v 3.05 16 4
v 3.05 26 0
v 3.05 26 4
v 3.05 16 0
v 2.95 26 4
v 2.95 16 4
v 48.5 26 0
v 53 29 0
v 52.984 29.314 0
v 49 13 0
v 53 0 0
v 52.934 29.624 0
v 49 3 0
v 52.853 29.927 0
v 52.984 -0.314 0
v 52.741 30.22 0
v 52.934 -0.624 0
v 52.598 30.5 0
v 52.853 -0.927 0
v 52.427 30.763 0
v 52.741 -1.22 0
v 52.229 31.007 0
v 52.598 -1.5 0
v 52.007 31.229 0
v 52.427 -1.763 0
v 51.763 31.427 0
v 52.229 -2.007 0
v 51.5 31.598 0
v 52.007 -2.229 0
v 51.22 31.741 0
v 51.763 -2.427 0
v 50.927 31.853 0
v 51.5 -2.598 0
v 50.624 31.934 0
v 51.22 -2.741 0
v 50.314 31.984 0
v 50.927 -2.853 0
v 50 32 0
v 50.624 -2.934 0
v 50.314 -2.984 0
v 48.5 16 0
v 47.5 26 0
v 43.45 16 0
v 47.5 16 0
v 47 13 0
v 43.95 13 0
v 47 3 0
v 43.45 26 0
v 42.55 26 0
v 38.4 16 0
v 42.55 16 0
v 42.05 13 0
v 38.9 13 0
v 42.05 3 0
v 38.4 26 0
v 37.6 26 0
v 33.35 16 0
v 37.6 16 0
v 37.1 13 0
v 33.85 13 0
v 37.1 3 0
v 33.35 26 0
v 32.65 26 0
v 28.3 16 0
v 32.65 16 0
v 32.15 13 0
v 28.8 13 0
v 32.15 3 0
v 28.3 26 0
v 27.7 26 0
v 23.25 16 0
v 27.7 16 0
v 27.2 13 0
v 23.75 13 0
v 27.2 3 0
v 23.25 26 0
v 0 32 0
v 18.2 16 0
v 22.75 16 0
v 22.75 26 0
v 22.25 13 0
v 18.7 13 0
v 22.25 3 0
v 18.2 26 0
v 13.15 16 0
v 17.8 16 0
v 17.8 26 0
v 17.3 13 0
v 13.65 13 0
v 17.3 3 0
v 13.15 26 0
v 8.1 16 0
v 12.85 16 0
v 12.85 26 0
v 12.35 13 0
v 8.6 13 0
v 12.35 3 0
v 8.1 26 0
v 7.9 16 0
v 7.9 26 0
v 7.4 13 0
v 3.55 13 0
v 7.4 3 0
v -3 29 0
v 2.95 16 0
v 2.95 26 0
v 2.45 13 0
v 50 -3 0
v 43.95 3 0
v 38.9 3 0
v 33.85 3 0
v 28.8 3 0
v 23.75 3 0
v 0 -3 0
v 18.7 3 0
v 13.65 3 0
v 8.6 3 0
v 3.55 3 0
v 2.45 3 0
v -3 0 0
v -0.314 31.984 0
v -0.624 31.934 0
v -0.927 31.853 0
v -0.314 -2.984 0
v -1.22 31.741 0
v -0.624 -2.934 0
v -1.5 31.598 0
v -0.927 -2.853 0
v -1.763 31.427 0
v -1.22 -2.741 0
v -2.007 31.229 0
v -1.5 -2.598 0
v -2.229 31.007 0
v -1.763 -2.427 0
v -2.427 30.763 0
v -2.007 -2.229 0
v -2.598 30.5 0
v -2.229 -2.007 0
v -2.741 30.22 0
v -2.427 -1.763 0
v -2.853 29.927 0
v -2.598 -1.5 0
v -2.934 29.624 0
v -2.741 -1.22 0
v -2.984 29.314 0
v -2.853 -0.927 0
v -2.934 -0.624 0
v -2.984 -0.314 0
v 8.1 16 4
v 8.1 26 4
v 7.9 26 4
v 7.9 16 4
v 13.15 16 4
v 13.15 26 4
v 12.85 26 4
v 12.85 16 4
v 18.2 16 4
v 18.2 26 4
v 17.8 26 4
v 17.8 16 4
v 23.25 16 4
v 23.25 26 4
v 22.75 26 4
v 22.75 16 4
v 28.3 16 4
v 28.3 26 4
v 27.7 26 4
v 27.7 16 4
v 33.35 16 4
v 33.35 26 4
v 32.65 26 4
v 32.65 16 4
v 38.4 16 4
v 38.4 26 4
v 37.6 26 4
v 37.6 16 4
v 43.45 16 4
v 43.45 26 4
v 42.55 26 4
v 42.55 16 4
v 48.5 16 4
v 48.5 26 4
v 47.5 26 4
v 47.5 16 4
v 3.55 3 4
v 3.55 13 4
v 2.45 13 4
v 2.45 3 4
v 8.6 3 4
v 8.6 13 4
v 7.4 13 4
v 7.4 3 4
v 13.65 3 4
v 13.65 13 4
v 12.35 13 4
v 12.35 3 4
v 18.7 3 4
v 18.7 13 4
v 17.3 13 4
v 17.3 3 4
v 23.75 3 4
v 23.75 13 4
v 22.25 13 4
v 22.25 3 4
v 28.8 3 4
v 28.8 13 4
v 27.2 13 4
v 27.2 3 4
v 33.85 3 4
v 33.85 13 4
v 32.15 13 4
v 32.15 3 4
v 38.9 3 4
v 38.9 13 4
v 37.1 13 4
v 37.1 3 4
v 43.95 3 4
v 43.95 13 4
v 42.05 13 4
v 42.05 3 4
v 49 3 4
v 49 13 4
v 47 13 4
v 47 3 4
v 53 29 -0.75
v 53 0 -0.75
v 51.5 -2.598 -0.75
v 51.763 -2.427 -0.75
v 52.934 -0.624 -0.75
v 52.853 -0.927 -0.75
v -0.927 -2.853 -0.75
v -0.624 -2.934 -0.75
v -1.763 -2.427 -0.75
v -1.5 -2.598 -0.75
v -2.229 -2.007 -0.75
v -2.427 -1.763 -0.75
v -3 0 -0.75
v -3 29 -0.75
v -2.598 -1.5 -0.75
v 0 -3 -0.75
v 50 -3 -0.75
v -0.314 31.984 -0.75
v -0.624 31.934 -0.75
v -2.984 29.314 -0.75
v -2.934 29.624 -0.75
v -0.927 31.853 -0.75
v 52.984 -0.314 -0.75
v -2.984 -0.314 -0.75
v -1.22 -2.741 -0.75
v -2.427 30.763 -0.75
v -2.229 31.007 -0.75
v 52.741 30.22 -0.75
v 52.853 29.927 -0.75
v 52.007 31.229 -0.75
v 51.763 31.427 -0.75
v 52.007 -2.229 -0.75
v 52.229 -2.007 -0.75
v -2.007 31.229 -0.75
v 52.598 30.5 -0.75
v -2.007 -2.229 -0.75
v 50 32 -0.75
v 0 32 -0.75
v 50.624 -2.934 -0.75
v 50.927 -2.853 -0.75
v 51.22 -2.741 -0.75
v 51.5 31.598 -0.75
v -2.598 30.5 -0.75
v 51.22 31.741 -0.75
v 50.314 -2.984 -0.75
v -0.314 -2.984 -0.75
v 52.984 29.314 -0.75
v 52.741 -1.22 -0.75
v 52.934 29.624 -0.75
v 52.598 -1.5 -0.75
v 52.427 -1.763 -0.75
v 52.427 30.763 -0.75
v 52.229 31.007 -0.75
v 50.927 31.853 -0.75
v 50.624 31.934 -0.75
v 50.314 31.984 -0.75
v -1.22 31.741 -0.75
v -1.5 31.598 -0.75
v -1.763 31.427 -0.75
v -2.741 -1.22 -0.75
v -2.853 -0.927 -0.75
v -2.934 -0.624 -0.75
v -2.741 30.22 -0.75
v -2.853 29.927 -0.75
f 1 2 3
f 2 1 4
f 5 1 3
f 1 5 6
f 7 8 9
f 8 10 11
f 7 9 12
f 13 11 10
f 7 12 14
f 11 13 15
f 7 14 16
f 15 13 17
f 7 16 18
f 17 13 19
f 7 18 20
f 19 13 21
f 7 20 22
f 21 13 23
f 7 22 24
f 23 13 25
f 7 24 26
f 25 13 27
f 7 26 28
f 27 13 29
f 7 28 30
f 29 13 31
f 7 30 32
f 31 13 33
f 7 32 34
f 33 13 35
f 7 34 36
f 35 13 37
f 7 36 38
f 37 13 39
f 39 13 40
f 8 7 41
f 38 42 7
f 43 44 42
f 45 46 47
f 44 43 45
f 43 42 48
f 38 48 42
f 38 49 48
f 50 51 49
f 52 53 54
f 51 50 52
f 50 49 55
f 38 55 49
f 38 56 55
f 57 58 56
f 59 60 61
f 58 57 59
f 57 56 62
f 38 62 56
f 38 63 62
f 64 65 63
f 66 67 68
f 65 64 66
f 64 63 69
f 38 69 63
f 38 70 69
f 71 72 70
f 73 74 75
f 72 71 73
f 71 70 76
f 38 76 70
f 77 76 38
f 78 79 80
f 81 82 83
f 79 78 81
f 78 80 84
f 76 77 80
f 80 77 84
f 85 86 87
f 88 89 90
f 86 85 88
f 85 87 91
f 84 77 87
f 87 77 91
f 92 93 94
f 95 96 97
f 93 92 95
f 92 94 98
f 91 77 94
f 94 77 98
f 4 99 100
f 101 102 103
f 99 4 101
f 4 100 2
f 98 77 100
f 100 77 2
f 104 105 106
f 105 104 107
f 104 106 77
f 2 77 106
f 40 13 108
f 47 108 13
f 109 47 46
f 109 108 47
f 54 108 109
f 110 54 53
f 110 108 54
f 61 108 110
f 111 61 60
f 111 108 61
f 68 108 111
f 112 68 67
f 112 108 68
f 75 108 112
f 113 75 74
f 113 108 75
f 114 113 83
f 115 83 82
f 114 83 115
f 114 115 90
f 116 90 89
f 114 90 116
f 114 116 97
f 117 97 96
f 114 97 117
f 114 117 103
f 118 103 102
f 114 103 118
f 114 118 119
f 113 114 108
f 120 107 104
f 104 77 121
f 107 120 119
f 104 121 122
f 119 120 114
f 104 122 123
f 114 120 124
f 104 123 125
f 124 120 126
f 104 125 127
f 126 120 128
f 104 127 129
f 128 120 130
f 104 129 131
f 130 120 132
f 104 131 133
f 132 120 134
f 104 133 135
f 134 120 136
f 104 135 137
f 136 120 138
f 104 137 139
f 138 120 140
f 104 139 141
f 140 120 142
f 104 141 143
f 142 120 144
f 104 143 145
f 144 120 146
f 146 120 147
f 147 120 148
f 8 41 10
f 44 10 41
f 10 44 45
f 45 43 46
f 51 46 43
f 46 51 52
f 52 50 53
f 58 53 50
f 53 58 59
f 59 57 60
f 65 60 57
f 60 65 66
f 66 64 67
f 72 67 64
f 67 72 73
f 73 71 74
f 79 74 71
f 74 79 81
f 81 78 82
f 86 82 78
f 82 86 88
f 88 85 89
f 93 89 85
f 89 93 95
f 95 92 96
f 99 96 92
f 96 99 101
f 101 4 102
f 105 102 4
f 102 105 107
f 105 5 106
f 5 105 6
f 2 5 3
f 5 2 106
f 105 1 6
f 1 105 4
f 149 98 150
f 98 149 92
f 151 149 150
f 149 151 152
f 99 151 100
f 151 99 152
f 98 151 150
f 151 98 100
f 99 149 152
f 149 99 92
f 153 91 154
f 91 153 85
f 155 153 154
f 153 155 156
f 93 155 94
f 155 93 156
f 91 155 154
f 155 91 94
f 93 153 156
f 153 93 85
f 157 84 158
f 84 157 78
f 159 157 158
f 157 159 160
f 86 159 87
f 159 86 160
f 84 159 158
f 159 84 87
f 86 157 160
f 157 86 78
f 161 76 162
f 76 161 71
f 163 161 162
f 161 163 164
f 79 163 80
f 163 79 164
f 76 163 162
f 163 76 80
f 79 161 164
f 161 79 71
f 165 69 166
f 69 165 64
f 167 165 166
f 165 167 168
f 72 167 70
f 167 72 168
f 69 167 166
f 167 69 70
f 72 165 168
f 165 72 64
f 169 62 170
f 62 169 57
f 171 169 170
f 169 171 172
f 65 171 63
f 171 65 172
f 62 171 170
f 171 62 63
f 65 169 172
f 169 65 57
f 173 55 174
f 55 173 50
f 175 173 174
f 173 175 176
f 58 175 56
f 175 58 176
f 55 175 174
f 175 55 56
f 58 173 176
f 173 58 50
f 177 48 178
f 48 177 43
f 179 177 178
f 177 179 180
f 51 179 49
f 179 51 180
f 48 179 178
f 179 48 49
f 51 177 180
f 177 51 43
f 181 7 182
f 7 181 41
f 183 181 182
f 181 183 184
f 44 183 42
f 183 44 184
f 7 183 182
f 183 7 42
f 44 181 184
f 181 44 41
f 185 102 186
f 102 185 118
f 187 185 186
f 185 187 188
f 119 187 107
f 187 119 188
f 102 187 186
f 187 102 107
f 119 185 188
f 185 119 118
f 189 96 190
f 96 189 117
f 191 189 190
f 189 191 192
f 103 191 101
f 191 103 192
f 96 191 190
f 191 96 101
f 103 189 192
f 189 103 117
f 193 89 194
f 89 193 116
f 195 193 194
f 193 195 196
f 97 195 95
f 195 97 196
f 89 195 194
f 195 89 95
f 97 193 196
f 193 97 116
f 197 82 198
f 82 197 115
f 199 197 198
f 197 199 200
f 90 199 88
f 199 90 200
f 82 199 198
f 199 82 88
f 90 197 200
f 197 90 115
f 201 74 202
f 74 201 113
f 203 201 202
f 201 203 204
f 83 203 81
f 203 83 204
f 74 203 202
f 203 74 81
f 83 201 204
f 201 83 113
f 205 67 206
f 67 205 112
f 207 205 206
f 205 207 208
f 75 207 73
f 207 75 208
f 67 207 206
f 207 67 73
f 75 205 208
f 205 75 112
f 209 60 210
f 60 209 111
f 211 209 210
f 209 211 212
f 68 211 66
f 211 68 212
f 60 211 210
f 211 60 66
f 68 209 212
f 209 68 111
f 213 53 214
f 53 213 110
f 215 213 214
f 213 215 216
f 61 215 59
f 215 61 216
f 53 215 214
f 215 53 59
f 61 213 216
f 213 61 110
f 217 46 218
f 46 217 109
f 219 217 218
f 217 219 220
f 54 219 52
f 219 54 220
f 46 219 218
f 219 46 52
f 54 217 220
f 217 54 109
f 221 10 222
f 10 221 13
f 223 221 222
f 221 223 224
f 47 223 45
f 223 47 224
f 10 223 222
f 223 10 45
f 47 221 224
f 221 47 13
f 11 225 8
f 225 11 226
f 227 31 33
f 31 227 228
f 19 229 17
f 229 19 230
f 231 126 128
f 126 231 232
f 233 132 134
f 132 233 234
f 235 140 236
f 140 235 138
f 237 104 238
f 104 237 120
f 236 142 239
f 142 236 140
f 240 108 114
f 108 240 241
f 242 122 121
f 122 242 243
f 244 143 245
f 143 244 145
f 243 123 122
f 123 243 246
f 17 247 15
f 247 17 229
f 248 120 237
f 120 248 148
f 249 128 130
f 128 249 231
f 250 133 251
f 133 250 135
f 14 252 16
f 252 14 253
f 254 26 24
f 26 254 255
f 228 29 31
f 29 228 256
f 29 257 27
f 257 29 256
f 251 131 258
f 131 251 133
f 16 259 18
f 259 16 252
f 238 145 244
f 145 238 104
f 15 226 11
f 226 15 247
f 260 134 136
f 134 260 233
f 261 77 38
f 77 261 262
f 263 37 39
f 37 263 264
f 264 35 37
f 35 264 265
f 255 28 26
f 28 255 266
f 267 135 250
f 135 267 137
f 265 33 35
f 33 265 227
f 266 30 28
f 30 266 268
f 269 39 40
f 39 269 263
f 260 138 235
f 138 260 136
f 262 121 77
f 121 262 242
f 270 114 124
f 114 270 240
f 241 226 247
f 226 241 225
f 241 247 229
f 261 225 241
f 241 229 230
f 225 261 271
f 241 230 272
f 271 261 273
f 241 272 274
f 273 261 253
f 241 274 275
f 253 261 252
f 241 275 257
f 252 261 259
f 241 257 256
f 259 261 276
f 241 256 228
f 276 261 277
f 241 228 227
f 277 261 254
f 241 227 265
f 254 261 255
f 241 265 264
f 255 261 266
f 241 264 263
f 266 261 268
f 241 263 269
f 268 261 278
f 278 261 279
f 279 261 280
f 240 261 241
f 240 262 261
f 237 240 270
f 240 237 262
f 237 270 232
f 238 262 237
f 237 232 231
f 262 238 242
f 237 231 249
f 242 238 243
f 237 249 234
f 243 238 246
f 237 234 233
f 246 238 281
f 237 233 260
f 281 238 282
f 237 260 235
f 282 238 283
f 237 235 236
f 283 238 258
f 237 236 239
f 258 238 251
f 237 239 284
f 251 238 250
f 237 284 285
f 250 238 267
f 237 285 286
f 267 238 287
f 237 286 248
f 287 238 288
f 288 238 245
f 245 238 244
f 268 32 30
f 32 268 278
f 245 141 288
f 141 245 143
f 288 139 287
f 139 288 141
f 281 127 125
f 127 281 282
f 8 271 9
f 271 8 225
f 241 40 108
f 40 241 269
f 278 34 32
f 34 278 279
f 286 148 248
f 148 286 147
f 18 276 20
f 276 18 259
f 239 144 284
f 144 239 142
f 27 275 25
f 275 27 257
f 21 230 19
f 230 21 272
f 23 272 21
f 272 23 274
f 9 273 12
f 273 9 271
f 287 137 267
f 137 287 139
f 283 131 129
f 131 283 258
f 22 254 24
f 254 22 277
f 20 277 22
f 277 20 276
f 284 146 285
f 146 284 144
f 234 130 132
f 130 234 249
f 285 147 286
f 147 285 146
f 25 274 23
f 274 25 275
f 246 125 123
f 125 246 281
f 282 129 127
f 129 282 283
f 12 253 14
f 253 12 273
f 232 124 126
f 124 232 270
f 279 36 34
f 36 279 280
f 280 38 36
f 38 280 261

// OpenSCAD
// wall/gap test print (vertical)


// wall height or gap test
_1_style = 1; //[1:Wall,2:Gap]

// start thickness
_2_start = 0.1;

// end thickness
_3_end = 2.0;

// thickness increment between samples
_4_increment = 0.1;

// space between samples
_5_gap = 3.0; // [1:10]

// wall height
_6_height = 4; // [1:50]

// wall length
_7_length = 10; // [1:50]

// thickness of the base
_8_baseHeight = 1.0; // [1:10]

// number of columns across
_9_numColumns = 10; // [1:20]

// ignore (angle resolution)
$fn=60;

////////////////////////////////////////////////////////////
module addWall(thickness, xspacing, yspacing, xpos, ypos, h) {
	echo (ypos, xpos, thickness);
	translate([xspacing * xpos, -yspacing * ypos, 0]) {
		cube([thickness, _7_length, h]);
	}
}

module addWallGrid(wallHeight) {
	count = round((_3_end-_2_start)/_4_increment)+1;
	xspacing = _5_gap + _3_end;
	yspacing = _5_gap + _7_length;
	translate([_5_gap, -_5_gap - _7_length, 0]) {
		for (index = [0:count-1]) {
			assign(thickness = _2_start + _4_increment * index) {
				translate([-thickness/2, 0, 0]) {
					addWall(thickness, xspacing, yspacing, index%_9_numColumns, floor(index/_9_numColumns), wallHeight);
				}
			}
		}
	}
}

module addBase(x, y, height) {
	translate([0, 0, -height*.75]) {
		minkowski() {
			cube([x, y, height/2]);
			cylinder(r=_5_gap,h=height/4);
		}
	}
}

module thinWallTest() {
	count = round((_3_end-_2_start)/_4_increment)+1;
	xspacing = _5_gap + _3_end;
	yspacing = _5_gap + _7_length;
	xdim = xspacing * min(_9_numColumns, count);
	ydim = yspacing * ceil(count/_9_numColumns)+_5_gap;
	if (_1_style == 1) {
		union () {
			addBase(xdim, ydim, _8_baseHeight);
			translate([0, ydim, 0]) { 
				addWallGrid(_6_height);
			}
		}
	} else {
		difference () {
			addBase(xdim, ydim, _8_baseHeight);
			translate([0, ydim, -_8_baseHeight-1]) {
				addWallGrid(_8_baseHeight+2);
			}
		}
	}	
}

thinWallTest();
